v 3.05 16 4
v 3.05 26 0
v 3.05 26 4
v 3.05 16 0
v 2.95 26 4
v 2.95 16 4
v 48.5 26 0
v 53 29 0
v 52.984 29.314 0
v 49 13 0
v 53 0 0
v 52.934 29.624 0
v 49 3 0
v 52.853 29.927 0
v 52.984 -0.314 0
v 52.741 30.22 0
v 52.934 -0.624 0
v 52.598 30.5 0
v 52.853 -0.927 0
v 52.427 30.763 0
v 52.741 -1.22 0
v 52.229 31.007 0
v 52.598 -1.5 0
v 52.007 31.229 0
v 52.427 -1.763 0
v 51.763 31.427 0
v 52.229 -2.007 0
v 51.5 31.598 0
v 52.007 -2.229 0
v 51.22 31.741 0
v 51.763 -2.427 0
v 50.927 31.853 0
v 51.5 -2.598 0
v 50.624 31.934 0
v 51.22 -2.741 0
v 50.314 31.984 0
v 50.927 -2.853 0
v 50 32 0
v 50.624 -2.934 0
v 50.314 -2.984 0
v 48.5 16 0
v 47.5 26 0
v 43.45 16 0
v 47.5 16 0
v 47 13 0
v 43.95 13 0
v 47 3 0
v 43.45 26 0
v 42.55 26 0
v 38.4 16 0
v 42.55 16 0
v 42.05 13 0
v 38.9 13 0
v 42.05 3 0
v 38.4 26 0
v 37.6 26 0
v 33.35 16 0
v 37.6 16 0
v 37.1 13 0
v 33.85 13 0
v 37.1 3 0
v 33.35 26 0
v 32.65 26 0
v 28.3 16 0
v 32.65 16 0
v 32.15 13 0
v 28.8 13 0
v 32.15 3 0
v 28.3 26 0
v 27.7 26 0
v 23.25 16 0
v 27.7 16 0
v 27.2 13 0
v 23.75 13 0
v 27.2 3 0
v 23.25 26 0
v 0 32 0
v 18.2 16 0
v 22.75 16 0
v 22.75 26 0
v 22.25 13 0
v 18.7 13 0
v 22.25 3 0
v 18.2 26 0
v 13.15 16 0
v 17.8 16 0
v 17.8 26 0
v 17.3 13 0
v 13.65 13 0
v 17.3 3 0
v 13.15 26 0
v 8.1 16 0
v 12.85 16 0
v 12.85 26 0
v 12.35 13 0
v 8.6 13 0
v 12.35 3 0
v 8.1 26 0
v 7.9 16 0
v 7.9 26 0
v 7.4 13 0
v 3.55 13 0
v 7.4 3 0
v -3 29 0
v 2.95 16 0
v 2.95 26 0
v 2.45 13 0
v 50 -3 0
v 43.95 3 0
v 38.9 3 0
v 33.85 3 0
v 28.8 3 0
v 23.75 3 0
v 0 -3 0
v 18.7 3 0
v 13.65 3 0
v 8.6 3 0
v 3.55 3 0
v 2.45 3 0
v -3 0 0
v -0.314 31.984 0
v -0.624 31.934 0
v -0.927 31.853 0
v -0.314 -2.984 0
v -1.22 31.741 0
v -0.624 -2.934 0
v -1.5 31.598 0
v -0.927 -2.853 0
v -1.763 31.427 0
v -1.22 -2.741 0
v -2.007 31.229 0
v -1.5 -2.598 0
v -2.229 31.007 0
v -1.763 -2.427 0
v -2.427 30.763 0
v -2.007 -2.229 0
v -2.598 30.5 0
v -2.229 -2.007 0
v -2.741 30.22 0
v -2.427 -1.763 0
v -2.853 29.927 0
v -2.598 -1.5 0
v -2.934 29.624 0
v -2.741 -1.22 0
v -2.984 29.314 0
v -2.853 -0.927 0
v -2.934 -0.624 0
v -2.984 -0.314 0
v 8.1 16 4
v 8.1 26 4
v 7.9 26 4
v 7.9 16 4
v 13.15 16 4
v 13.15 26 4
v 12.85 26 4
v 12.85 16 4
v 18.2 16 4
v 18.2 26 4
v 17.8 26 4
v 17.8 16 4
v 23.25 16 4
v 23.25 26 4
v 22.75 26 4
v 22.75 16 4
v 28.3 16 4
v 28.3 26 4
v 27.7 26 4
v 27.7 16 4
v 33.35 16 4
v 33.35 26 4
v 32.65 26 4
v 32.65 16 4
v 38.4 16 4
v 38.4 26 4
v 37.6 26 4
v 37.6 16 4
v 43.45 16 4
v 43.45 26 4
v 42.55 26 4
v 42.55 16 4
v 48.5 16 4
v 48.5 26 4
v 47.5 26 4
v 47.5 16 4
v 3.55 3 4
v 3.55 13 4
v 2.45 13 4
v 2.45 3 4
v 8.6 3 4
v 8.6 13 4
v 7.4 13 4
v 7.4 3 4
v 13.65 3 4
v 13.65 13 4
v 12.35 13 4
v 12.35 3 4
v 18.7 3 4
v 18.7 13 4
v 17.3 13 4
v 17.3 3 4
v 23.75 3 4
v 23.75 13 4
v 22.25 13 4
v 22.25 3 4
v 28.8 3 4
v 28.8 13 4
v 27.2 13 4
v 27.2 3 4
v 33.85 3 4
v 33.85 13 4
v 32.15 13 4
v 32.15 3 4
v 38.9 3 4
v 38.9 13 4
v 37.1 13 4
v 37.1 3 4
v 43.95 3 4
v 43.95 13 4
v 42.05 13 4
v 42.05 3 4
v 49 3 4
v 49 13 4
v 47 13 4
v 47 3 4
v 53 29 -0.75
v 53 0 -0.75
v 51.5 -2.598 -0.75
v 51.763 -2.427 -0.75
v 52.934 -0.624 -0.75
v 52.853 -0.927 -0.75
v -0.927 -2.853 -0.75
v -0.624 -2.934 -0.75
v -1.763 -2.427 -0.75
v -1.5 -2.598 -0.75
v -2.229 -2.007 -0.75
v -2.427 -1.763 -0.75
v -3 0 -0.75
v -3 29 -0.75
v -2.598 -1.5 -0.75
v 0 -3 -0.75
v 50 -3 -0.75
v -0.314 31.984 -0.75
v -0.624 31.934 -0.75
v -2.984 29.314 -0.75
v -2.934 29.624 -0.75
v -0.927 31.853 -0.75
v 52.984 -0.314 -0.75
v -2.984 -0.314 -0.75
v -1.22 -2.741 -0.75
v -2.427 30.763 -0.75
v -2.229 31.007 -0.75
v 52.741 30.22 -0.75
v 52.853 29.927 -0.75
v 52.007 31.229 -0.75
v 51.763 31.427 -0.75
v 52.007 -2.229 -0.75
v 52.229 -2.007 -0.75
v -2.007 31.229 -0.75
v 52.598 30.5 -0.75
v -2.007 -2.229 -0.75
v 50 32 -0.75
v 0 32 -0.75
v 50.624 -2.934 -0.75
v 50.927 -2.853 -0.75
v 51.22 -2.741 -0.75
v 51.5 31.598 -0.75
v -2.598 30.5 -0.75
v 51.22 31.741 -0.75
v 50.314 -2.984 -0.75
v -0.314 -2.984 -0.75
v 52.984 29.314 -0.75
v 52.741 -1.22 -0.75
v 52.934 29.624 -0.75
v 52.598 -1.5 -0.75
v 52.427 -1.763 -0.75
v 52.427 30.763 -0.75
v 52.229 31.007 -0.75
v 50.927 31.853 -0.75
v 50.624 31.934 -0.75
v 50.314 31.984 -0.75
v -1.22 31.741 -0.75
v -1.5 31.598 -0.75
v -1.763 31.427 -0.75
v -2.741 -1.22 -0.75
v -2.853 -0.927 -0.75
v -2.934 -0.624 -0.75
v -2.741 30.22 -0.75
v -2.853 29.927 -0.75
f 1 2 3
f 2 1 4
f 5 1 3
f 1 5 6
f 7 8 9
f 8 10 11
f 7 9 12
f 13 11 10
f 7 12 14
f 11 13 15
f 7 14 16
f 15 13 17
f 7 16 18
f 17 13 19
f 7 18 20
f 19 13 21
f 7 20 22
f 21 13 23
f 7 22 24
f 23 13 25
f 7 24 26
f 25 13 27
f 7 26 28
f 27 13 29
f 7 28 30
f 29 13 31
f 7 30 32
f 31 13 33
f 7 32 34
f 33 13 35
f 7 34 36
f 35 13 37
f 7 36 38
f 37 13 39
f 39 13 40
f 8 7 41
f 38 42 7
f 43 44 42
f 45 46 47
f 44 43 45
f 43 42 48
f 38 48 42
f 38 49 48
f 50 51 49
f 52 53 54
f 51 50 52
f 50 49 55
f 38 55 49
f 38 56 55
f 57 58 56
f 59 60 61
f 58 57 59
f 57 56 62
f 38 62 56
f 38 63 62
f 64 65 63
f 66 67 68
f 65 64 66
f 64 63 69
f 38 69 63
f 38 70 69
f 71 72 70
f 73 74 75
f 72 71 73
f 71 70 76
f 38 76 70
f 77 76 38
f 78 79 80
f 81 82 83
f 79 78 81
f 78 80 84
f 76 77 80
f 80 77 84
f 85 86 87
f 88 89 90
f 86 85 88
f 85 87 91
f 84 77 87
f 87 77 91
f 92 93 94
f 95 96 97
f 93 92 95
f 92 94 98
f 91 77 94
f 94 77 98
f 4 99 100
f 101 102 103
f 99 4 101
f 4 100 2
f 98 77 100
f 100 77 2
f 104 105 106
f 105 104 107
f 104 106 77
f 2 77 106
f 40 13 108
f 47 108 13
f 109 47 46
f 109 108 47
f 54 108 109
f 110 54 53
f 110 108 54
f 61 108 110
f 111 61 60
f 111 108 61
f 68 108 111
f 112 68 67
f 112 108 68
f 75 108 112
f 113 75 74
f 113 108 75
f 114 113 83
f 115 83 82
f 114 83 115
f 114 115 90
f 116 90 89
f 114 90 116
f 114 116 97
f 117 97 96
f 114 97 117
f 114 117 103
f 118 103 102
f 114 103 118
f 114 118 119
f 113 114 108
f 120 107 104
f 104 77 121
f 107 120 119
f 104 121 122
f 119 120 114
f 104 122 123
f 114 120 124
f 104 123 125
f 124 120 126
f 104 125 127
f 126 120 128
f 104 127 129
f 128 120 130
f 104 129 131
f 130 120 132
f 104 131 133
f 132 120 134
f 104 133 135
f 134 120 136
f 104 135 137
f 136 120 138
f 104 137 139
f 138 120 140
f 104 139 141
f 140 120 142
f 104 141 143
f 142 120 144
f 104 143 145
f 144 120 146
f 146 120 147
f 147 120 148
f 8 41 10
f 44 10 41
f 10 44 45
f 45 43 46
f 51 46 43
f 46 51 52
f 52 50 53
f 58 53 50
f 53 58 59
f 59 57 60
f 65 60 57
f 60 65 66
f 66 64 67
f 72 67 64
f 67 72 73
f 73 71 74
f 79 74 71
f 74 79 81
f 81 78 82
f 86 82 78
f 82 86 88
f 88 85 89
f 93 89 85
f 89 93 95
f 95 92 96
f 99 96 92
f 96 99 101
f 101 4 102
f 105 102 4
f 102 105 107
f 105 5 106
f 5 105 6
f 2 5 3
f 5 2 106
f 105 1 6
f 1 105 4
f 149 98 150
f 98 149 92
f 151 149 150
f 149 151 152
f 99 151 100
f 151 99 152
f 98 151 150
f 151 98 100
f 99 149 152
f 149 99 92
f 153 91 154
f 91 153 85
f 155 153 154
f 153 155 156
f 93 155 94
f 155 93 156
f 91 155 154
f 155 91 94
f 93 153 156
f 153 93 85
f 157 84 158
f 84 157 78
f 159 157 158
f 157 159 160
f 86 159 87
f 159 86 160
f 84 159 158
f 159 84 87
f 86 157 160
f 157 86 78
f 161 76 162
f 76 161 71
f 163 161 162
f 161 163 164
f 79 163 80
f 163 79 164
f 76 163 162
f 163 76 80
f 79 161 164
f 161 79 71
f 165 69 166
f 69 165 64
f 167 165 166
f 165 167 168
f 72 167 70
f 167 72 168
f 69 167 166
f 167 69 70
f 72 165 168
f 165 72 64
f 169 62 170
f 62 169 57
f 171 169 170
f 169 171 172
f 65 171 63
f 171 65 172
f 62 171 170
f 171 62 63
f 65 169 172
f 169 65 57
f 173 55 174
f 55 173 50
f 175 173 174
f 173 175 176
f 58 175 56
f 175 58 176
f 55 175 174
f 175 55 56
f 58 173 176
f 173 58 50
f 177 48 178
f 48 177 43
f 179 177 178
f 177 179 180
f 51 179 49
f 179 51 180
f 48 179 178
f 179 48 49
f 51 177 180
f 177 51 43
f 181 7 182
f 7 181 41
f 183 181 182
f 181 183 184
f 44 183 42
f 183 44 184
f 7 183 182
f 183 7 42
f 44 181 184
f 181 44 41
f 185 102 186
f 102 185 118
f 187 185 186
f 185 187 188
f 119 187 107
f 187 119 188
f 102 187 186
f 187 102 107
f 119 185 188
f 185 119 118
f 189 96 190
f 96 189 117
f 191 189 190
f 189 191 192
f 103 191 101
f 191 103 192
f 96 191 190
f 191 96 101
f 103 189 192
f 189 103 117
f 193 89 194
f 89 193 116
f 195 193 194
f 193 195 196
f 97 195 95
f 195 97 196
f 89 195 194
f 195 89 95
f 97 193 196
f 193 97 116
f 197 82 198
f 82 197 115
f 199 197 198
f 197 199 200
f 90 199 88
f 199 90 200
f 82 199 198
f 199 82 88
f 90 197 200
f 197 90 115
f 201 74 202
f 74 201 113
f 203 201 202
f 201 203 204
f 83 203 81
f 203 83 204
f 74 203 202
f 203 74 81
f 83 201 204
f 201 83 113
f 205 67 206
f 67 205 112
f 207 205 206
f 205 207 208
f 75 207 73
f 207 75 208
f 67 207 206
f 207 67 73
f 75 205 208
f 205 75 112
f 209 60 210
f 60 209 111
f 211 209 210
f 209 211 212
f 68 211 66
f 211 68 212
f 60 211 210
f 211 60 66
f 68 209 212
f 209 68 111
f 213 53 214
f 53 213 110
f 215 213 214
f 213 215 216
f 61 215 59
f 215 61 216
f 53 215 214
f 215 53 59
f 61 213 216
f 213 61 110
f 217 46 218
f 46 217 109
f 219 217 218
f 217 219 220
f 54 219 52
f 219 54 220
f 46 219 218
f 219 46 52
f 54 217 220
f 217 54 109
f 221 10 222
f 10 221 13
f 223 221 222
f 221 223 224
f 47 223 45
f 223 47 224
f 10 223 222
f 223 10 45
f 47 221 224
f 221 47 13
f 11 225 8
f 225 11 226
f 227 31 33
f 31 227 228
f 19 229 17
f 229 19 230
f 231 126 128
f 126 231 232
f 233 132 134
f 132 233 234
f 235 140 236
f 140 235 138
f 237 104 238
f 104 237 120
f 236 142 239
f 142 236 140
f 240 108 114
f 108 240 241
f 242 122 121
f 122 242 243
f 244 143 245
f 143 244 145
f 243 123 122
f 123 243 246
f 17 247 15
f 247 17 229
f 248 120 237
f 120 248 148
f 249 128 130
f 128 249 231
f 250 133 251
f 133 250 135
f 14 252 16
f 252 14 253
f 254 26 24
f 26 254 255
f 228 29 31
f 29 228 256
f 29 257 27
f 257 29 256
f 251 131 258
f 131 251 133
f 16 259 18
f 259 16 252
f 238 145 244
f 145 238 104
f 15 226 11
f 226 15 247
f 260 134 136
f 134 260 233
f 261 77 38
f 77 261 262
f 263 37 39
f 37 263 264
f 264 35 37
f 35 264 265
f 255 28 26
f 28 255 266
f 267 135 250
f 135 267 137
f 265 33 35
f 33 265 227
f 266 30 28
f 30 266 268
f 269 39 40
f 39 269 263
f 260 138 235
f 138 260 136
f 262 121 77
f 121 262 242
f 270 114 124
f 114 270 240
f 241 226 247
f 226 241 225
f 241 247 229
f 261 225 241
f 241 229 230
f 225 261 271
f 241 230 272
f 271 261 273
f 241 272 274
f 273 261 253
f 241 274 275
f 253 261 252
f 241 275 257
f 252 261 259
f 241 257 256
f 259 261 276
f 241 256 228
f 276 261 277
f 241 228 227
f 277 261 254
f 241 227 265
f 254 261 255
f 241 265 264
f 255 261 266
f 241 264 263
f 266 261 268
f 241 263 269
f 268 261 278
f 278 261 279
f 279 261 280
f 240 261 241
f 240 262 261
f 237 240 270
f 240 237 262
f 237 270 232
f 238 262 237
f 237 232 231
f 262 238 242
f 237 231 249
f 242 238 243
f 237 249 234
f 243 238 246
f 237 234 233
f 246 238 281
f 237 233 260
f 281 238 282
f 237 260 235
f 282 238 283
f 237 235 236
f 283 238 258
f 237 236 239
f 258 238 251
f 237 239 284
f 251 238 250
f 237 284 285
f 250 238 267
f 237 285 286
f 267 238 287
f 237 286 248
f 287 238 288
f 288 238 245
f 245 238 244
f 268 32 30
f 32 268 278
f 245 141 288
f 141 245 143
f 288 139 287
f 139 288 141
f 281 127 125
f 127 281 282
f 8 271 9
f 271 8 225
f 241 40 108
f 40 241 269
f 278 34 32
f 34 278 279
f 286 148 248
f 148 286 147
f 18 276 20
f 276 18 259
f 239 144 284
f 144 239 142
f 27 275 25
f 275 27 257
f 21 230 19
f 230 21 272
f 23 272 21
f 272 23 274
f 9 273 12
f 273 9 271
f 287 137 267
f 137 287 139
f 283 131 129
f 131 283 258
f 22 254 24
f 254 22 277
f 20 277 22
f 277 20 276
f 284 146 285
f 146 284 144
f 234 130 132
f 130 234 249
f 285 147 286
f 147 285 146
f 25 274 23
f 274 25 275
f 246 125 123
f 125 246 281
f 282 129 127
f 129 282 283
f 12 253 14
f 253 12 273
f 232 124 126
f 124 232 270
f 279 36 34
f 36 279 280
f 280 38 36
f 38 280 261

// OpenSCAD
// wall/gap test print (vertical)


// wall height or gap test
_1_style = 1; //[1:Wall,2:Gap]

// start thickness
_2_start = 0.1;

// end thickness
_3_end = 2.0;

// thickness increment between samples
_4_increment = 0.1;

// space between samples
_5_gap = 3.0; // [1:10]

// wall height
_6_height = 4; // [1:50]

// wall length
_7_length = 10; // [1:50]

// thickness of the base
_8_baseHeight = 1.0; // [1:10]

// number of columns across
_9_numColumns = 10; // [1:20]

// ignore (angle resolution)
$fn=60;

////////////////////////////////////////////////////////////
module addWall(thickness, xspacing, yspacing, xpos, ypos, h) {
	echo (ypos, xpos, thickness);
	translate([xspacing * xpos, -yspacing * ypos, 0]) {
		cube([thickness, _7_length, h]);
	}
}

module addWallGrid(wallHeight) {
	count = round((_3_end-_2_start)/_4_increment)+1;
	xspacing = _5_gap + _3_end;
	yspacing = _5_gap + _7_length;
	translate([_5_gap, -_5_gap - _7_length, 0]) {
		for (index = [0:count-1]) {
			assign(thickness = _2_start + _4_increment * index) {
				translate([-thickness/2, 0, 0]) {
					addWall(thickness, xspacing, yspacing, index%_9_numColumns, floor(index/_9_numColumns), wallHeight);
				}
			}
		}
	}
}

module addBase(x, y, height) {
	translate([0, 0, -height*.75]) {
		minkowski() {
			cube([x, y, height/2]);
			cylinder(r=_5_gap,h=height/4);
		}
	}
}

module thinWallTest() {
	count = round((_3_end-_2_start)/_4_increment)+1;
	xspacing = _5_gap + _3_end;
	yspacing = _5_gap + _7_length;
	xdim = xspacing * min(_9_numColumns, count);
	ydim = yspacing * ceil(count/_9_numColumns)+_5_gap;
	if (_1_style == 1) {
		union () {
			addBase(xdim, ydim, _8_baseHeight);
			translate([0, ydim, 0]) { 
				addWallGrid(_6_height);
			}
		}
	} else {
		difference () {
			addBase(xdim, ydim, _8_baseHeight);
			translate([0, ydim, -_8_baseHeight-1]) {
				addWallGrid(_8_baseHeight+2);
			}
		}
	}	
}

thinWallTest();
